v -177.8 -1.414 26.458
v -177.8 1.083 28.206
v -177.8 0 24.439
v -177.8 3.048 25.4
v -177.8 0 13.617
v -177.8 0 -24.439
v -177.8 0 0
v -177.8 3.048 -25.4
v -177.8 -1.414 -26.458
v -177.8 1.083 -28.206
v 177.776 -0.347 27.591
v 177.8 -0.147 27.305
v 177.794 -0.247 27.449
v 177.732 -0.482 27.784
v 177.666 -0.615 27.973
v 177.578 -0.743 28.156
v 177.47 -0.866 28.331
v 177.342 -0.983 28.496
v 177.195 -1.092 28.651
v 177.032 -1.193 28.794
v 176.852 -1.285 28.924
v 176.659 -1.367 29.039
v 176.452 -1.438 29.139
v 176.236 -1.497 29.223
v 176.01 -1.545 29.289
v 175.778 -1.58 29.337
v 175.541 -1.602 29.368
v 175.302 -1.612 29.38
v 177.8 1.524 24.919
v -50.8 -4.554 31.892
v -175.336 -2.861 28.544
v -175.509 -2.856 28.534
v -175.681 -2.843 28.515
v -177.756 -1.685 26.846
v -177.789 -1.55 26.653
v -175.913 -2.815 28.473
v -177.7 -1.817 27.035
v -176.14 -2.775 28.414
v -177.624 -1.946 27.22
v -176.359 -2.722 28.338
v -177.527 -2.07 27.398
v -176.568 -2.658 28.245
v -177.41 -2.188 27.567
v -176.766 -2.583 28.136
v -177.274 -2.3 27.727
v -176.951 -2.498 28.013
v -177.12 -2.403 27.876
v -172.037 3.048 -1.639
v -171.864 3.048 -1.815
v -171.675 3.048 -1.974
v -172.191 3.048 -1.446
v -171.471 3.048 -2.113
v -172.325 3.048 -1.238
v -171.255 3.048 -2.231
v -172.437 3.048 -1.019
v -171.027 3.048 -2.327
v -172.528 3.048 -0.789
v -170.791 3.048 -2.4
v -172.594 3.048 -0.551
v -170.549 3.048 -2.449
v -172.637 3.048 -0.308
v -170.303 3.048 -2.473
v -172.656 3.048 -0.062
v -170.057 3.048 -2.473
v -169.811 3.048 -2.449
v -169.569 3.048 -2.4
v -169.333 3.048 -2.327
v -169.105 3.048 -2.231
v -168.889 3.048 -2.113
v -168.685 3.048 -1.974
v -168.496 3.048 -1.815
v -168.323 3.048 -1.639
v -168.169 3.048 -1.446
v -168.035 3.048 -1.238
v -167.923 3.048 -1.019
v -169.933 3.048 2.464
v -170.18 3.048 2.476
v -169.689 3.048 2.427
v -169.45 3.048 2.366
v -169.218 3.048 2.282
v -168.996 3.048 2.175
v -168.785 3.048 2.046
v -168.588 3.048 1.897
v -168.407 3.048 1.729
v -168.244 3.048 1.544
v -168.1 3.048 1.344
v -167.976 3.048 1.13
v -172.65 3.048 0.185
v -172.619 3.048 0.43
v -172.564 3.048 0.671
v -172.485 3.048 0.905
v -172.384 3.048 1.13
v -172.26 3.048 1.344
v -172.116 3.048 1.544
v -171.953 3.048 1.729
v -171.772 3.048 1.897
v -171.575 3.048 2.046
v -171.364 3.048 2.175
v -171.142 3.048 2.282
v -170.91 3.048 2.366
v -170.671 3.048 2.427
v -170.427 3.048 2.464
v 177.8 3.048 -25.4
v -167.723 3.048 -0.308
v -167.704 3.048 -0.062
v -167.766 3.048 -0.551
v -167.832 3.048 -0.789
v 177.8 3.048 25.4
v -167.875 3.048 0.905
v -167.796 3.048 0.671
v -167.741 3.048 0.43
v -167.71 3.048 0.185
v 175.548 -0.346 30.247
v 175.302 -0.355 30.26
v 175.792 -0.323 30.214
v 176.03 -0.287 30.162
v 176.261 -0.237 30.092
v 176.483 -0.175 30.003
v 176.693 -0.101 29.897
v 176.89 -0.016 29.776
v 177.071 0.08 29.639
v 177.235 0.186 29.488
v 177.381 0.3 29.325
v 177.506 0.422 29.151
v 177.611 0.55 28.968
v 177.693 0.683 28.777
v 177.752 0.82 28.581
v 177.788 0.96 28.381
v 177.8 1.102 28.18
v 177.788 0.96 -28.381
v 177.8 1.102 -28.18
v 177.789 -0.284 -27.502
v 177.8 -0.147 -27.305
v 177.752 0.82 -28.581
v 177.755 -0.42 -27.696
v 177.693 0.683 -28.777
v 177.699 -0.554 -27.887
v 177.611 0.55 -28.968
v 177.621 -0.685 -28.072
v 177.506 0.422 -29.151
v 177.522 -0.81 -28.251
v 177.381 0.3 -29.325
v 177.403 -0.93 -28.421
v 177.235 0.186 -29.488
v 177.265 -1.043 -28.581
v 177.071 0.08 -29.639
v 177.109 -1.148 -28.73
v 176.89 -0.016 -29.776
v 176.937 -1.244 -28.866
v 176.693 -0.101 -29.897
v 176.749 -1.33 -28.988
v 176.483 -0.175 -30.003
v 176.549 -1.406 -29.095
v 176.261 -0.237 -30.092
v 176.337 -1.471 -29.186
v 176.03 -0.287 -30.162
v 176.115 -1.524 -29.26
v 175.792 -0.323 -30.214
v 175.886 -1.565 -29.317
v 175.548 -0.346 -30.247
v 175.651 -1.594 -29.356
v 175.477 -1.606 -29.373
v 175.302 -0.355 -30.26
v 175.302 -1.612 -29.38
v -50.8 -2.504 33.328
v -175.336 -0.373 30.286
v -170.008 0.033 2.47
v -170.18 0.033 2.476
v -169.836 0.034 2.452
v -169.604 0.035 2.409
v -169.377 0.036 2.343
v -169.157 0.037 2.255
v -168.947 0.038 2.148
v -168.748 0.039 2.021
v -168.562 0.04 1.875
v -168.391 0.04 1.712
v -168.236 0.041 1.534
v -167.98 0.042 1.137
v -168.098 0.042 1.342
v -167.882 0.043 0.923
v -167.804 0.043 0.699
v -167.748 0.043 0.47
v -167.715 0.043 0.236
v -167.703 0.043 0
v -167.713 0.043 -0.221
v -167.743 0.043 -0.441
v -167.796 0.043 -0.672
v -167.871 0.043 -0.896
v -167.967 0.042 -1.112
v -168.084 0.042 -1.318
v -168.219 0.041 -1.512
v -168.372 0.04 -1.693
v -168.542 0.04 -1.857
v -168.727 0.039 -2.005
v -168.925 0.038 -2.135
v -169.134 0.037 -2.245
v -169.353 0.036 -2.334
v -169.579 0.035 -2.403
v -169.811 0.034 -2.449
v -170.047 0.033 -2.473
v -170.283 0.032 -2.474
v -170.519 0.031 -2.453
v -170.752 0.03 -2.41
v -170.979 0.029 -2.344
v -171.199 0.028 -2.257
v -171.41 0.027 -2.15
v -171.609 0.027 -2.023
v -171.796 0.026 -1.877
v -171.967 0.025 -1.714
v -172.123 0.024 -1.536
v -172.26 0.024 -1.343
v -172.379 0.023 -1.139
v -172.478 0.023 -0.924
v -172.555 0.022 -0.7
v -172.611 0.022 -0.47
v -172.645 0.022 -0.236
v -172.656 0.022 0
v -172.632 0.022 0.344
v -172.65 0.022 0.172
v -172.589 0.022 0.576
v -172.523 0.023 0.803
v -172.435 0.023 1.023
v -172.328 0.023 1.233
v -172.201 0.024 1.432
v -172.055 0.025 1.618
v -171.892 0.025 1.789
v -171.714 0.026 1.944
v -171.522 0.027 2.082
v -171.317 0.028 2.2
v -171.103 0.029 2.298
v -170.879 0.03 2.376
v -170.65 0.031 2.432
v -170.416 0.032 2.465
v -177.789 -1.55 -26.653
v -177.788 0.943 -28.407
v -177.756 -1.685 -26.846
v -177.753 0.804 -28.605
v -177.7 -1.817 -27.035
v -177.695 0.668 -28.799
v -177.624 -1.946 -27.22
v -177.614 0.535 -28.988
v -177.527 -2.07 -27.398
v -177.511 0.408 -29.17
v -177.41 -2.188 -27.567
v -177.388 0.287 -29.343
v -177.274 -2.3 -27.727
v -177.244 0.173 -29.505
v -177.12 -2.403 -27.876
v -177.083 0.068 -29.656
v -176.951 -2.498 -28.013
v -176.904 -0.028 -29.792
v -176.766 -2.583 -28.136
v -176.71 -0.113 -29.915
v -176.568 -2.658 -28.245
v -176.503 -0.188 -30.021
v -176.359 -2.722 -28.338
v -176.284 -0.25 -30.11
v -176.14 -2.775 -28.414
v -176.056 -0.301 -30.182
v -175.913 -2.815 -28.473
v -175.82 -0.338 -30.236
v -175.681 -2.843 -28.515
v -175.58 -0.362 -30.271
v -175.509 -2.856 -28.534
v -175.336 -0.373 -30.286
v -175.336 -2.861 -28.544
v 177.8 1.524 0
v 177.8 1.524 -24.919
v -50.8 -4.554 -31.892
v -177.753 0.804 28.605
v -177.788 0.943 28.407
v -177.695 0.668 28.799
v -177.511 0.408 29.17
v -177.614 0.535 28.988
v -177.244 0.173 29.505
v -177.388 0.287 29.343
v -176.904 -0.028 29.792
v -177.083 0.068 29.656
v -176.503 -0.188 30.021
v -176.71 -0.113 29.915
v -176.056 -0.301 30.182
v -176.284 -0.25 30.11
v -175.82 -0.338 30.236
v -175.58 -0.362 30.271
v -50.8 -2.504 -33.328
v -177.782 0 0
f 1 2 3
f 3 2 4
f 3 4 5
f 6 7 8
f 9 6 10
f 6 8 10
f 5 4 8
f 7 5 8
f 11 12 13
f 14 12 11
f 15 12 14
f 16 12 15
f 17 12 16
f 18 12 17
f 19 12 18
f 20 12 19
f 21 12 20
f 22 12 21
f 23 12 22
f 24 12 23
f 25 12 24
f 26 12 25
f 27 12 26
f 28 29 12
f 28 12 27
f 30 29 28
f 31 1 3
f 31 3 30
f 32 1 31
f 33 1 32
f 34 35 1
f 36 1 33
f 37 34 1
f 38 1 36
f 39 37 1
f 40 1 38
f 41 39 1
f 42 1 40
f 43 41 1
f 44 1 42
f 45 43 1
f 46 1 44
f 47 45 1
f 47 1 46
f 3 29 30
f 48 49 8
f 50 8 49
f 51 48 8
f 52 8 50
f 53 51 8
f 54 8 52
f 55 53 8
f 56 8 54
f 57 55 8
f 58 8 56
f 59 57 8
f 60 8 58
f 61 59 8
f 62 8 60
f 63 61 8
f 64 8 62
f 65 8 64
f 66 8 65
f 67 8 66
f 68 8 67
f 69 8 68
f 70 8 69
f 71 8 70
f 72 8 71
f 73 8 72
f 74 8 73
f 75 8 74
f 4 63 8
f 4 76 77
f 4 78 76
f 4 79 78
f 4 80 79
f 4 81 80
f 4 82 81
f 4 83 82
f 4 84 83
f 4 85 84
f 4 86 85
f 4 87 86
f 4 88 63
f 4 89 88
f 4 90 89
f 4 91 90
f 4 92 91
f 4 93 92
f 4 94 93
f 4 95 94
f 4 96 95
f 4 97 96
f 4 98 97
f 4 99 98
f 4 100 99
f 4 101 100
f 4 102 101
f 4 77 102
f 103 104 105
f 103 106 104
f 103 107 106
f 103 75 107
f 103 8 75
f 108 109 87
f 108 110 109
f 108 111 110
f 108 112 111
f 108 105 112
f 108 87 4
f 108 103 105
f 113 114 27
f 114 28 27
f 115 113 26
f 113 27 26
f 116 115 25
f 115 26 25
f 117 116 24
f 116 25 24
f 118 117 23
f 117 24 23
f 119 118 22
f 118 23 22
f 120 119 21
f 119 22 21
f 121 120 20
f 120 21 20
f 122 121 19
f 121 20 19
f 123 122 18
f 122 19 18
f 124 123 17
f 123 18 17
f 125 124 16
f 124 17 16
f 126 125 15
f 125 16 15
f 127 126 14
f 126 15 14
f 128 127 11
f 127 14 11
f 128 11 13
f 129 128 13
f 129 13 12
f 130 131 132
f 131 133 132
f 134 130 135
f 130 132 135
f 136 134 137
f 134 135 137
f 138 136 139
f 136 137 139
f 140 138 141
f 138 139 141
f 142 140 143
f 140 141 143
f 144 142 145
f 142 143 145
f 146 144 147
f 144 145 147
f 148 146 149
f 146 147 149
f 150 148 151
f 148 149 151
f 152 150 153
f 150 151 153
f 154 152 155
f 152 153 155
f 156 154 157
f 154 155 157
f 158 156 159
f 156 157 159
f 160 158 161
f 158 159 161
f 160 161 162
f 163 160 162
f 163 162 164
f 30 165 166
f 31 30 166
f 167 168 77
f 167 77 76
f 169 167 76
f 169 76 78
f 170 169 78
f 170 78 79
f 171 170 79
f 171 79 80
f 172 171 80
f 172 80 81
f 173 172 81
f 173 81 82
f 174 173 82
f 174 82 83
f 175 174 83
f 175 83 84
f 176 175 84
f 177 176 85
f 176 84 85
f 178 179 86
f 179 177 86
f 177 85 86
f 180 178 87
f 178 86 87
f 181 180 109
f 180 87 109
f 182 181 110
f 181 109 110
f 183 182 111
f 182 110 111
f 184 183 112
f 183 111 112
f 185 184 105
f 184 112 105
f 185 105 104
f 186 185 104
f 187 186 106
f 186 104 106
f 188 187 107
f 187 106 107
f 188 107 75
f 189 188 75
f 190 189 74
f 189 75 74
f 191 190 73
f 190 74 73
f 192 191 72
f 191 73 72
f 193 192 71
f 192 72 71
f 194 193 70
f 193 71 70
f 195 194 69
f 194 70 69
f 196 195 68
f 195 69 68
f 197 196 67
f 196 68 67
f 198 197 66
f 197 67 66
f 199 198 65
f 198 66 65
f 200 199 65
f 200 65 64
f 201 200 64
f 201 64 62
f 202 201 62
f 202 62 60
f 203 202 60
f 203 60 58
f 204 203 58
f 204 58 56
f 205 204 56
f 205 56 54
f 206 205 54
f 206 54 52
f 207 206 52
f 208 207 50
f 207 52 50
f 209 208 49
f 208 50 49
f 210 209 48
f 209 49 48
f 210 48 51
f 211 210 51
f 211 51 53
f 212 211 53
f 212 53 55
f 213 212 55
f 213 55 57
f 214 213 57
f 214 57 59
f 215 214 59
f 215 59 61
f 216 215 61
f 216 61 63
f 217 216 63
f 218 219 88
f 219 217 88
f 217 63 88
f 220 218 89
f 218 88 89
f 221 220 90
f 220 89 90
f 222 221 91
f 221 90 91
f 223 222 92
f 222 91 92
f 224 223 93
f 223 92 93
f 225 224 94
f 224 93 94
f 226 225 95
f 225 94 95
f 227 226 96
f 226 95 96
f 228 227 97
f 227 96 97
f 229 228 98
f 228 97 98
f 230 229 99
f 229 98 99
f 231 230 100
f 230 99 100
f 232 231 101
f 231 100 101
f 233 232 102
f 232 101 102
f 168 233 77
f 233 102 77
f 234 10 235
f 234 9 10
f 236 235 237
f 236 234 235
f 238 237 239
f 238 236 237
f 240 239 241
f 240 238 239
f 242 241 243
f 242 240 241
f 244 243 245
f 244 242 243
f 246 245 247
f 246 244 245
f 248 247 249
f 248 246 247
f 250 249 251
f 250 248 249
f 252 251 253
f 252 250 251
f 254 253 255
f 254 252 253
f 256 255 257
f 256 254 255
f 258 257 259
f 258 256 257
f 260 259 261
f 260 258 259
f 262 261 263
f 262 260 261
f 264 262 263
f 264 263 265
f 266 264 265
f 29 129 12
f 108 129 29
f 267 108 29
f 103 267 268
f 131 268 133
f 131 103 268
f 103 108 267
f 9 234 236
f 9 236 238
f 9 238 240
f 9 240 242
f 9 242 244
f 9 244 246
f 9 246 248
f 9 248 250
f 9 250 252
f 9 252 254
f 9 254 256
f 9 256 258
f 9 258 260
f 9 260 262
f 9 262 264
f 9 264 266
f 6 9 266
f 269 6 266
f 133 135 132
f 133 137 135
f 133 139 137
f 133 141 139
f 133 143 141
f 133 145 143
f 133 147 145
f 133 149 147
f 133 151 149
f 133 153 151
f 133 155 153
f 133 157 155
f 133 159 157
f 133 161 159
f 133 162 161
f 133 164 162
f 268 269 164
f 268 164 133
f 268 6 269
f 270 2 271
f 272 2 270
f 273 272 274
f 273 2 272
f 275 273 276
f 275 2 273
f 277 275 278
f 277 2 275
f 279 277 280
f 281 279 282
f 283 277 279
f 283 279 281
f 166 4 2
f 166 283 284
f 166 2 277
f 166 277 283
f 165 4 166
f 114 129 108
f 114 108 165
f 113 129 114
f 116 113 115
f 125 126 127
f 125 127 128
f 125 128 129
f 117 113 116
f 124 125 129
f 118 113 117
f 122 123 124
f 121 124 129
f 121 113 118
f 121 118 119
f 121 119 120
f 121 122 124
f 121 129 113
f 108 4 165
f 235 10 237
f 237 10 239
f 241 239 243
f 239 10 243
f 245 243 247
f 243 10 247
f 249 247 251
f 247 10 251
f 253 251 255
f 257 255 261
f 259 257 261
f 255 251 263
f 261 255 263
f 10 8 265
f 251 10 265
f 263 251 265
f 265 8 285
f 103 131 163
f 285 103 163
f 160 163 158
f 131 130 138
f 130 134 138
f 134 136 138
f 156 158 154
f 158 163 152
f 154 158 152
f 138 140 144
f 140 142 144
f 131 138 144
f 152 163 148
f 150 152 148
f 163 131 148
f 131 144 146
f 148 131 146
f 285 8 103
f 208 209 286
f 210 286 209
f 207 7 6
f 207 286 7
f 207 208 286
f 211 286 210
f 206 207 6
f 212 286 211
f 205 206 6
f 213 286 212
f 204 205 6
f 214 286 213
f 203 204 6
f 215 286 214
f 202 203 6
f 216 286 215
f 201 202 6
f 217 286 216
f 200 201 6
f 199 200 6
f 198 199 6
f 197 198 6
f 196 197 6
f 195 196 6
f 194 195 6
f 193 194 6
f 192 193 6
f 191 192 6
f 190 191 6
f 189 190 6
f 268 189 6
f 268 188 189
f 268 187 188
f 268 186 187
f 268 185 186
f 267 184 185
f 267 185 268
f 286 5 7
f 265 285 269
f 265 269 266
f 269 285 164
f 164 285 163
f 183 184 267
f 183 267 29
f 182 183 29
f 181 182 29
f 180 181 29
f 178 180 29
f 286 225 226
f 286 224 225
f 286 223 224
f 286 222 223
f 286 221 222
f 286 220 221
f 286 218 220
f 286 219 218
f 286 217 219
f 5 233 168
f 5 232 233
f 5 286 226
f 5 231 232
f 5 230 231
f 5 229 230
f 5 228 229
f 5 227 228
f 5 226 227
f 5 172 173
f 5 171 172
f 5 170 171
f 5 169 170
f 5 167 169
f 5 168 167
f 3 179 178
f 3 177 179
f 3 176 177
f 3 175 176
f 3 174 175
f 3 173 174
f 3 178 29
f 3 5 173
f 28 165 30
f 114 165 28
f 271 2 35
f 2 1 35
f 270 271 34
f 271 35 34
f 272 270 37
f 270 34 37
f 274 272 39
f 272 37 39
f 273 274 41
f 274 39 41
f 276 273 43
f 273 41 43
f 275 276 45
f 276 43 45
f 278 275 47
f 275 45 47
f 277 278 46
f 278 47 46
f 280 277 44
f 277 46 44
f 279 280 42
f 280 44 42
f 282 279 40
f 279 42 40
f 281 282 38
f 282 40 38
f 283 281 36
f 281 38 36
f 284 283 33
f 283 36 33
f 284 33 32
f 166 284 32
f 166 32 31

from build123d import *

# Parameters (mm, degrees)
BOSS_EXTRUDE1_DEPTH = 177.8
CUT_EXTRUDE2_REACH  = 182.717
CUT_LOFT2_DEPTH     = 6.207121586
CUT_LOFT2_DRAFT     = -55.0003318
CUT_EXTRUDE4_REACH  = 182.717
CUT_LOFT3_START     = -177.779804528
CUT_LOFT3_DEPTH     = 355.618213607
FILLET7_R           = 2.54
FILLET8_R           = 2.54
CUT_EXTRUDE5_REACH  = 183.056
SKETCH19_R          = 2.4765


# Read off the part's stored shape, not the designer's step: Cut-Loft2, Cut-Loft3
with BuildPart() as part:
    # Sketch1 → Boss-Extrude1 (new, symmetric)
    with BuildSketch(Plane(origin=(0, 0, 0), x_dir=(0, 0, -1), z_dir=(1, 0, 0))):
        Polygon((0, 3.048), (25.4, 3.048), (35.052, -3.710403159), (33.303739022, -6.20717859), (24.438969291, 0), (0, 0), align=None)
    boss_extrude1 = extrude(amount=BOSS_EXTRUDE1_DEPTH, both=True)

    # Sketch4 → Cut-Extrude2 (cut, up to next)
    with BuildSketch(Plane(origin=(0, 13.979334982, -9.788435734), x_dir=(1, 0, 0), z_dir=(0, 0.8191520442889915, -0.5735764363510467)), mode=Mode.PRIVATE) as cut_extrude2_sk1:
        Polygon((-177.8, 30.841117278), (177.8, 24.949659112), (177.8, 30.841117278), align=None)
    cut_extrude2_tool1 = extrude(cut_extrude2_sk1.sketch, amount=-CUT_EXTRUDE2_REACH, mode=Mode.PRIVATE) & part.part
    cut_extrude2 = cut_extrude2_tool1.solids().sort_by_distance((59.266667, -2.584003, -33.443333))[0]
    add(cut_extrude2, mode=Mode.SUBTRACT)


with BuildPart() as cut_loft2_tool:
    # Cut-Loft2 outline → Cut-Loft2 (with draft: the straight prism first)
    with BuildSketch(Plane(origin=(-0.003265654, 0.761986004, 0), x_dir=(0.9999908164530384, 0.0042856749276558815, 0), z_dir=(0.0042856749276558815, -0.9999908164530384, 0))):
        Polygon((177.804898534, -24.919484646), (177.804898534, 0), (-177.798367166, 0), (-177.798367166, -24.438969291), align=None)
    extrude(amount=CUT_LOFT2_DEPTH)
    # Cut-Loft2: the draft: its side faces are tilted about the plane it starts from
    cut_loft2_sides = [cut_loft2_tool.faces().sort_by_distance(p)[0] for p in [
        (177.813300853, -1.579532292, -12.459742323),
        (0.013300853, -2.341532292, 0),
        (-177.786699148, -3.103532292, -12.219484645),
        (0.013300853, -2.341532292, -24.679226969),
    ]]
    draft(cut_loft2_sides, Plane(origin=(-0.003265654, 0.761986004, 0), x_dir=(0.9999908164530384, 0.0042856749276558815, 0), z_dir=(0.0042856749276558815, -0.9999908164530384, 0)), CUT_LOFT2_DRAFT)


with BuildPart() as part_1:
    add(part.part)

    # Cut-Loft2: cut by cut_loft2_tool
    add(cut_loft2_tool.part, mode=Mode.SUBTRACT)

    # Cut-Extrude4: up to this plane
    cut_extrude4_end = Plane(origin=(177.8, -1.579589295, -29.351869511), z_dir=(0.00428567492765589, -0.819144521567724, 0.5735711688849072))
    # Sketch12 → Cut-Extrude4 (cut, up to the surface)
    with BuildSketch(Plane(origin=(0, 13.979334982, -9.788435734), x_dir=(1, 0, 0), z_dir=(0, 0.8191520442889914, -0.5735764363510467)), mode=Mode.PRIVATE) as cut_extrude4_sk1:
        Polygon((-177.8, 30.841117278), (-50.8, 28.737025076), (-177.8, 24.949659112), align=None)
    cut_extrude4_tool1 = split(extrude(cut_extrude4_sk1.sketch, amount=-CUT_EXTRUDE4_REACH, mode=Mode.PRIVATE), bisect_by=cut_extrude4_end, keep=Keep.BOTH, mode=Mode.PRIVATE)
    cut_extrude4 = cut_extrude4_tool1.solids().sort_by_distance((-135.466667, -2.181717, -32.86881))[0]
    add(cut_extrude4, mode=Mode.SUBTRACT)

    # Mirror20: Boss-Extrude1 across plane
    add(boss_extrude1.mirror(Plane.XY))

    # Cut-Loft3 outline → Cut-Loft3 (cut)
    with BuildSketch(Plane(origin=(0, 0, 0), x_dir=(-0.004285667102275099, 0.999990816469807, -5.791138486653598e-06), z_dir=(0.9999899034999146, 0.0042856710149996365, 0.0013512668805631468)).offset(CUT_LOFT3_START)):
        Polygon((0.762004584, -2), (0.761850081, 24.679204437), (-5.720934875, 33.93758085), (-6.464848773, 35), (-8, 35), (-8, -2), align=None)
    extrude(amount=CUT_LOFT3_DEPTH, mode=Mode.SUBTRACT)

    # Mirror21: Cut-Extrude4 across plane
    add(cut_extrude4.mirror(Plane.XY), mode=Mode.SUBTRACT)

    # Mirror22: Cut-Extrude2 across plane
    add(cut_extrude2.mirror(Plane.XY), mode=Mode.SUBTRACT)

    # Fillet7
    fillet7_edges = [part_1.edges().sort_by_distance(p)[0] for p in [
        (-177.8, -1.579589295, -29.351869511),
        (-177.8, -1.579589295, 29.351869511),
    ]]
    fillet(fillet7_edges, radius=FILLET7_R)

    # Fillet8
    fillet8_edges = [part_1.edges().sort_by_distance(p)[0] for p in [
        (177.8, -0.955395437, -29.788934755),
        (177.8, -0.955395437, 29.788934755),
    ]]
    fillet(fillet8_edges, radius=FILLET8_R)

    # Cut-Extrude5: up to this plane
    cut_extrude5_end = Plane(origin=(177.8, 1.524, -24.919484646), z_dir=(0.004285674927655877, -0.9999908164530384, 0))
    # Sketch19 → Cut-Extrude5 (cut, up to the surface)
    with BuildSketch(Plane(origin=(0, 3.048, 0), x_dir=(1, 0, 0), z_dir=(0, 1, 0)), mode=Mode.PRIVATE) as cut_extrude5_sk1:
        with Locations(Location((-170.18, 0, 0), (0, 0, 270))):
            Circle(SKETCH19_R)
    cut_extrude5_tool1 = split(extrude(cut_extrude5_sk1.sketch, amount=-CUT_EXTRUDE5_REACH, mode=Mode.PRIVATE), bisect_by=cut_extrude5_end, keep=Keep.BOTH, mode=Mode.PRIVATE)
    add(cut_extrude5_tool1.solids().sort_by_distance((-170.18, 3.048, 0))[0], mode=Mode.SUBTRACT)


solid = part_1.part
